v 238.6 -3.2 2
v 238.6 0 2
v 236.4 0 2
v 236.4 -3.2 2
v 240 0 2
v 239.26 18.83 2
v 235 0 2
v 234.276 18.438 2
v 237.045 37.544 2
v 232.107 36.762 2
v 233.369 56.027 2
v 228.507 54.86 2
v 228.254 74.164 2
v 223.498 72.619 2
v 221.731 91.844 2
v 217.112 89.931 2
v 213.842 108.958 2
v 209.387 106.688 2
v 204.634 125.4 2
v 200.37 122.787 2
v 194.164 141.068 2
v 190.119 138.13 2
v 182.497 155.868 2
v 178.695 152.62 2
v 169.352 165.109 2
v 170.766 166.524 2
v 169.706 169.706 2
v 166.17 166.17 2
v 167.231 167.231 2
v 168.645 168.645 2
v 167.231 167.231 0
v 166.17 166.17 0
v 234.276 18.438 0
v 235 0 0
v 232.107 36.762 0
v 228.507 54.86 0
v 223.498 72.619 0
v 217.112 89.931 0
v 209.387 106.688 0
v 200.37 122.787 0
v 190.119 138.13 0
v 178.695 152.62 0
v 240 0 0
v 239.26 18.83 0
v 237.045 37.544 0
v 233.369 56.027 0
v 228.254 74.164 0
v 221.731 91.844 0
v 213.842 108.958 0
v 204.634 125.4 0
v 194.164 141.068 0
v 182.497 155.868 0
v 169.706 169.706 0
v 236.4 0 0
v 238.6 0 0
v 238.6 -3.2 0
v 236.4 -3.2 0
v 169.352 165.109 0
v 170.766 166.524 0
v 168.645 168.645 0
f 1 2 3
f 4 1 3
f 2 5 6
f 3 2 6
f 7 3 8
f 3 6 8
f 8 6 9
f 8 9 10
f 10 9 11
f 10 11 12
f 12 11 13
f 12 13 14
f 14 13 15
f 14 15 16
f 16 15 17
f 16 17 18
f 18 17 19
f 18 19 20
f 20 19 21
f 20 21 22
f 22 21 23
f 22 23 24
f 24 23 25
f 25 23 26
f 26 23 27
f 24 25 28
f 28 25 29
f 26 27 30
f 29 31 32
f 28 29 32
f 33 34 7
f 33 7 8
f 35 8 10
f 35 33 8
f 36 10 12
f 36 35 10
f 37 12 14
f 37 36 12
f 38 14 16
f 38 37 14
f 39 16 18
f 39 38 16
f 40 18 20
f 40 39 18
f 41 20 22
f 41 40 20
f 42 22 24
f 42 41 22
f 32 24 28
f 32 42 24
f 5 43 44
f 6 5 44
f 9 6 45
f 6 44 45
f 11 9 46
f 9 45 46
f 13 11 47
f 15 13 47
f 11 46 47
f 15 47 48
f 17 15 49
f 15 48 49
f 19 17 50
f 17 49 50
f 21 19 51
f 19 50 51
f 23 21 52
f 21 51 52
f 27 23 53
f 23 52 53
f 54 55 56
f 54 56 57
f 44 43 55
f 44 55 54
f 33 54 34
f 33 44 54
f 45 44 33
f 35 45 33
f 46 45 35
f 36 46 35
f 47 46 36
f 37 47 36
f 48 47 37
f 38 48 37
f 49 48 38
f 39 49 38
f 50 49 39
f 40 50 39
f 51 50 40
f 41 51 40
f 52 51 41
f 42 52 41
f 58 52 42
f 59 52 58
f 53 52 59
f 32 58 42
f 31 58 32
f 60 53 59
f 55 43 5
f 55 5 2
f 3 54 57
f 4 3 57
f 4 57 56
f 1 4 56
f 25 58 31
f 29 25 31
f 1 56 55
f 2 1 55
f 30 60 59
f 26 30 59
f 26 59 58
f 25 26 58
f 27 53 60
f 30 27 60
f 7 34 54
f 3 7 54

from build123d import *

# Parameters (mm, degrees)
PAD_DEPTH = 2


with BuildPart() as part:
    # Sketch → Pad (new body)
    with BuildSketch(Plane.XY):
        with BuildLine():
            ThreePointArc((235, 0), (217.11169, 89.930607), (166.170094, 166.170094))
            Line((167.230754, 167.230754), (166.170094, 166.170094))
            Line((169.352074, 165.109433), (167.230754, 167.230754))
            Line((170.766288, 166.523647), (169.352074, 165.109433))
            Line((168.644967, 168.644967), (170.766288, 166.523647))
            Line((169.705627, 169.705627), (168.644967, 168.644967))
            ThreePointArc((240, 0), (221.731088, 91.844024), (169.705627, 169.705627))
            Line((240, 0), (238.6, 0))
            Line((238.6, -3.2), (238.6, 0))
            Line((236.4, -3.2), (238.6, -3.2))
            Line((236.4, 0), (236.4, -3.2))
            Line((235, 0), (236.4, 0))
        make_face()
    extrude(amount=PAD_DEPTH)


solid = part.part
